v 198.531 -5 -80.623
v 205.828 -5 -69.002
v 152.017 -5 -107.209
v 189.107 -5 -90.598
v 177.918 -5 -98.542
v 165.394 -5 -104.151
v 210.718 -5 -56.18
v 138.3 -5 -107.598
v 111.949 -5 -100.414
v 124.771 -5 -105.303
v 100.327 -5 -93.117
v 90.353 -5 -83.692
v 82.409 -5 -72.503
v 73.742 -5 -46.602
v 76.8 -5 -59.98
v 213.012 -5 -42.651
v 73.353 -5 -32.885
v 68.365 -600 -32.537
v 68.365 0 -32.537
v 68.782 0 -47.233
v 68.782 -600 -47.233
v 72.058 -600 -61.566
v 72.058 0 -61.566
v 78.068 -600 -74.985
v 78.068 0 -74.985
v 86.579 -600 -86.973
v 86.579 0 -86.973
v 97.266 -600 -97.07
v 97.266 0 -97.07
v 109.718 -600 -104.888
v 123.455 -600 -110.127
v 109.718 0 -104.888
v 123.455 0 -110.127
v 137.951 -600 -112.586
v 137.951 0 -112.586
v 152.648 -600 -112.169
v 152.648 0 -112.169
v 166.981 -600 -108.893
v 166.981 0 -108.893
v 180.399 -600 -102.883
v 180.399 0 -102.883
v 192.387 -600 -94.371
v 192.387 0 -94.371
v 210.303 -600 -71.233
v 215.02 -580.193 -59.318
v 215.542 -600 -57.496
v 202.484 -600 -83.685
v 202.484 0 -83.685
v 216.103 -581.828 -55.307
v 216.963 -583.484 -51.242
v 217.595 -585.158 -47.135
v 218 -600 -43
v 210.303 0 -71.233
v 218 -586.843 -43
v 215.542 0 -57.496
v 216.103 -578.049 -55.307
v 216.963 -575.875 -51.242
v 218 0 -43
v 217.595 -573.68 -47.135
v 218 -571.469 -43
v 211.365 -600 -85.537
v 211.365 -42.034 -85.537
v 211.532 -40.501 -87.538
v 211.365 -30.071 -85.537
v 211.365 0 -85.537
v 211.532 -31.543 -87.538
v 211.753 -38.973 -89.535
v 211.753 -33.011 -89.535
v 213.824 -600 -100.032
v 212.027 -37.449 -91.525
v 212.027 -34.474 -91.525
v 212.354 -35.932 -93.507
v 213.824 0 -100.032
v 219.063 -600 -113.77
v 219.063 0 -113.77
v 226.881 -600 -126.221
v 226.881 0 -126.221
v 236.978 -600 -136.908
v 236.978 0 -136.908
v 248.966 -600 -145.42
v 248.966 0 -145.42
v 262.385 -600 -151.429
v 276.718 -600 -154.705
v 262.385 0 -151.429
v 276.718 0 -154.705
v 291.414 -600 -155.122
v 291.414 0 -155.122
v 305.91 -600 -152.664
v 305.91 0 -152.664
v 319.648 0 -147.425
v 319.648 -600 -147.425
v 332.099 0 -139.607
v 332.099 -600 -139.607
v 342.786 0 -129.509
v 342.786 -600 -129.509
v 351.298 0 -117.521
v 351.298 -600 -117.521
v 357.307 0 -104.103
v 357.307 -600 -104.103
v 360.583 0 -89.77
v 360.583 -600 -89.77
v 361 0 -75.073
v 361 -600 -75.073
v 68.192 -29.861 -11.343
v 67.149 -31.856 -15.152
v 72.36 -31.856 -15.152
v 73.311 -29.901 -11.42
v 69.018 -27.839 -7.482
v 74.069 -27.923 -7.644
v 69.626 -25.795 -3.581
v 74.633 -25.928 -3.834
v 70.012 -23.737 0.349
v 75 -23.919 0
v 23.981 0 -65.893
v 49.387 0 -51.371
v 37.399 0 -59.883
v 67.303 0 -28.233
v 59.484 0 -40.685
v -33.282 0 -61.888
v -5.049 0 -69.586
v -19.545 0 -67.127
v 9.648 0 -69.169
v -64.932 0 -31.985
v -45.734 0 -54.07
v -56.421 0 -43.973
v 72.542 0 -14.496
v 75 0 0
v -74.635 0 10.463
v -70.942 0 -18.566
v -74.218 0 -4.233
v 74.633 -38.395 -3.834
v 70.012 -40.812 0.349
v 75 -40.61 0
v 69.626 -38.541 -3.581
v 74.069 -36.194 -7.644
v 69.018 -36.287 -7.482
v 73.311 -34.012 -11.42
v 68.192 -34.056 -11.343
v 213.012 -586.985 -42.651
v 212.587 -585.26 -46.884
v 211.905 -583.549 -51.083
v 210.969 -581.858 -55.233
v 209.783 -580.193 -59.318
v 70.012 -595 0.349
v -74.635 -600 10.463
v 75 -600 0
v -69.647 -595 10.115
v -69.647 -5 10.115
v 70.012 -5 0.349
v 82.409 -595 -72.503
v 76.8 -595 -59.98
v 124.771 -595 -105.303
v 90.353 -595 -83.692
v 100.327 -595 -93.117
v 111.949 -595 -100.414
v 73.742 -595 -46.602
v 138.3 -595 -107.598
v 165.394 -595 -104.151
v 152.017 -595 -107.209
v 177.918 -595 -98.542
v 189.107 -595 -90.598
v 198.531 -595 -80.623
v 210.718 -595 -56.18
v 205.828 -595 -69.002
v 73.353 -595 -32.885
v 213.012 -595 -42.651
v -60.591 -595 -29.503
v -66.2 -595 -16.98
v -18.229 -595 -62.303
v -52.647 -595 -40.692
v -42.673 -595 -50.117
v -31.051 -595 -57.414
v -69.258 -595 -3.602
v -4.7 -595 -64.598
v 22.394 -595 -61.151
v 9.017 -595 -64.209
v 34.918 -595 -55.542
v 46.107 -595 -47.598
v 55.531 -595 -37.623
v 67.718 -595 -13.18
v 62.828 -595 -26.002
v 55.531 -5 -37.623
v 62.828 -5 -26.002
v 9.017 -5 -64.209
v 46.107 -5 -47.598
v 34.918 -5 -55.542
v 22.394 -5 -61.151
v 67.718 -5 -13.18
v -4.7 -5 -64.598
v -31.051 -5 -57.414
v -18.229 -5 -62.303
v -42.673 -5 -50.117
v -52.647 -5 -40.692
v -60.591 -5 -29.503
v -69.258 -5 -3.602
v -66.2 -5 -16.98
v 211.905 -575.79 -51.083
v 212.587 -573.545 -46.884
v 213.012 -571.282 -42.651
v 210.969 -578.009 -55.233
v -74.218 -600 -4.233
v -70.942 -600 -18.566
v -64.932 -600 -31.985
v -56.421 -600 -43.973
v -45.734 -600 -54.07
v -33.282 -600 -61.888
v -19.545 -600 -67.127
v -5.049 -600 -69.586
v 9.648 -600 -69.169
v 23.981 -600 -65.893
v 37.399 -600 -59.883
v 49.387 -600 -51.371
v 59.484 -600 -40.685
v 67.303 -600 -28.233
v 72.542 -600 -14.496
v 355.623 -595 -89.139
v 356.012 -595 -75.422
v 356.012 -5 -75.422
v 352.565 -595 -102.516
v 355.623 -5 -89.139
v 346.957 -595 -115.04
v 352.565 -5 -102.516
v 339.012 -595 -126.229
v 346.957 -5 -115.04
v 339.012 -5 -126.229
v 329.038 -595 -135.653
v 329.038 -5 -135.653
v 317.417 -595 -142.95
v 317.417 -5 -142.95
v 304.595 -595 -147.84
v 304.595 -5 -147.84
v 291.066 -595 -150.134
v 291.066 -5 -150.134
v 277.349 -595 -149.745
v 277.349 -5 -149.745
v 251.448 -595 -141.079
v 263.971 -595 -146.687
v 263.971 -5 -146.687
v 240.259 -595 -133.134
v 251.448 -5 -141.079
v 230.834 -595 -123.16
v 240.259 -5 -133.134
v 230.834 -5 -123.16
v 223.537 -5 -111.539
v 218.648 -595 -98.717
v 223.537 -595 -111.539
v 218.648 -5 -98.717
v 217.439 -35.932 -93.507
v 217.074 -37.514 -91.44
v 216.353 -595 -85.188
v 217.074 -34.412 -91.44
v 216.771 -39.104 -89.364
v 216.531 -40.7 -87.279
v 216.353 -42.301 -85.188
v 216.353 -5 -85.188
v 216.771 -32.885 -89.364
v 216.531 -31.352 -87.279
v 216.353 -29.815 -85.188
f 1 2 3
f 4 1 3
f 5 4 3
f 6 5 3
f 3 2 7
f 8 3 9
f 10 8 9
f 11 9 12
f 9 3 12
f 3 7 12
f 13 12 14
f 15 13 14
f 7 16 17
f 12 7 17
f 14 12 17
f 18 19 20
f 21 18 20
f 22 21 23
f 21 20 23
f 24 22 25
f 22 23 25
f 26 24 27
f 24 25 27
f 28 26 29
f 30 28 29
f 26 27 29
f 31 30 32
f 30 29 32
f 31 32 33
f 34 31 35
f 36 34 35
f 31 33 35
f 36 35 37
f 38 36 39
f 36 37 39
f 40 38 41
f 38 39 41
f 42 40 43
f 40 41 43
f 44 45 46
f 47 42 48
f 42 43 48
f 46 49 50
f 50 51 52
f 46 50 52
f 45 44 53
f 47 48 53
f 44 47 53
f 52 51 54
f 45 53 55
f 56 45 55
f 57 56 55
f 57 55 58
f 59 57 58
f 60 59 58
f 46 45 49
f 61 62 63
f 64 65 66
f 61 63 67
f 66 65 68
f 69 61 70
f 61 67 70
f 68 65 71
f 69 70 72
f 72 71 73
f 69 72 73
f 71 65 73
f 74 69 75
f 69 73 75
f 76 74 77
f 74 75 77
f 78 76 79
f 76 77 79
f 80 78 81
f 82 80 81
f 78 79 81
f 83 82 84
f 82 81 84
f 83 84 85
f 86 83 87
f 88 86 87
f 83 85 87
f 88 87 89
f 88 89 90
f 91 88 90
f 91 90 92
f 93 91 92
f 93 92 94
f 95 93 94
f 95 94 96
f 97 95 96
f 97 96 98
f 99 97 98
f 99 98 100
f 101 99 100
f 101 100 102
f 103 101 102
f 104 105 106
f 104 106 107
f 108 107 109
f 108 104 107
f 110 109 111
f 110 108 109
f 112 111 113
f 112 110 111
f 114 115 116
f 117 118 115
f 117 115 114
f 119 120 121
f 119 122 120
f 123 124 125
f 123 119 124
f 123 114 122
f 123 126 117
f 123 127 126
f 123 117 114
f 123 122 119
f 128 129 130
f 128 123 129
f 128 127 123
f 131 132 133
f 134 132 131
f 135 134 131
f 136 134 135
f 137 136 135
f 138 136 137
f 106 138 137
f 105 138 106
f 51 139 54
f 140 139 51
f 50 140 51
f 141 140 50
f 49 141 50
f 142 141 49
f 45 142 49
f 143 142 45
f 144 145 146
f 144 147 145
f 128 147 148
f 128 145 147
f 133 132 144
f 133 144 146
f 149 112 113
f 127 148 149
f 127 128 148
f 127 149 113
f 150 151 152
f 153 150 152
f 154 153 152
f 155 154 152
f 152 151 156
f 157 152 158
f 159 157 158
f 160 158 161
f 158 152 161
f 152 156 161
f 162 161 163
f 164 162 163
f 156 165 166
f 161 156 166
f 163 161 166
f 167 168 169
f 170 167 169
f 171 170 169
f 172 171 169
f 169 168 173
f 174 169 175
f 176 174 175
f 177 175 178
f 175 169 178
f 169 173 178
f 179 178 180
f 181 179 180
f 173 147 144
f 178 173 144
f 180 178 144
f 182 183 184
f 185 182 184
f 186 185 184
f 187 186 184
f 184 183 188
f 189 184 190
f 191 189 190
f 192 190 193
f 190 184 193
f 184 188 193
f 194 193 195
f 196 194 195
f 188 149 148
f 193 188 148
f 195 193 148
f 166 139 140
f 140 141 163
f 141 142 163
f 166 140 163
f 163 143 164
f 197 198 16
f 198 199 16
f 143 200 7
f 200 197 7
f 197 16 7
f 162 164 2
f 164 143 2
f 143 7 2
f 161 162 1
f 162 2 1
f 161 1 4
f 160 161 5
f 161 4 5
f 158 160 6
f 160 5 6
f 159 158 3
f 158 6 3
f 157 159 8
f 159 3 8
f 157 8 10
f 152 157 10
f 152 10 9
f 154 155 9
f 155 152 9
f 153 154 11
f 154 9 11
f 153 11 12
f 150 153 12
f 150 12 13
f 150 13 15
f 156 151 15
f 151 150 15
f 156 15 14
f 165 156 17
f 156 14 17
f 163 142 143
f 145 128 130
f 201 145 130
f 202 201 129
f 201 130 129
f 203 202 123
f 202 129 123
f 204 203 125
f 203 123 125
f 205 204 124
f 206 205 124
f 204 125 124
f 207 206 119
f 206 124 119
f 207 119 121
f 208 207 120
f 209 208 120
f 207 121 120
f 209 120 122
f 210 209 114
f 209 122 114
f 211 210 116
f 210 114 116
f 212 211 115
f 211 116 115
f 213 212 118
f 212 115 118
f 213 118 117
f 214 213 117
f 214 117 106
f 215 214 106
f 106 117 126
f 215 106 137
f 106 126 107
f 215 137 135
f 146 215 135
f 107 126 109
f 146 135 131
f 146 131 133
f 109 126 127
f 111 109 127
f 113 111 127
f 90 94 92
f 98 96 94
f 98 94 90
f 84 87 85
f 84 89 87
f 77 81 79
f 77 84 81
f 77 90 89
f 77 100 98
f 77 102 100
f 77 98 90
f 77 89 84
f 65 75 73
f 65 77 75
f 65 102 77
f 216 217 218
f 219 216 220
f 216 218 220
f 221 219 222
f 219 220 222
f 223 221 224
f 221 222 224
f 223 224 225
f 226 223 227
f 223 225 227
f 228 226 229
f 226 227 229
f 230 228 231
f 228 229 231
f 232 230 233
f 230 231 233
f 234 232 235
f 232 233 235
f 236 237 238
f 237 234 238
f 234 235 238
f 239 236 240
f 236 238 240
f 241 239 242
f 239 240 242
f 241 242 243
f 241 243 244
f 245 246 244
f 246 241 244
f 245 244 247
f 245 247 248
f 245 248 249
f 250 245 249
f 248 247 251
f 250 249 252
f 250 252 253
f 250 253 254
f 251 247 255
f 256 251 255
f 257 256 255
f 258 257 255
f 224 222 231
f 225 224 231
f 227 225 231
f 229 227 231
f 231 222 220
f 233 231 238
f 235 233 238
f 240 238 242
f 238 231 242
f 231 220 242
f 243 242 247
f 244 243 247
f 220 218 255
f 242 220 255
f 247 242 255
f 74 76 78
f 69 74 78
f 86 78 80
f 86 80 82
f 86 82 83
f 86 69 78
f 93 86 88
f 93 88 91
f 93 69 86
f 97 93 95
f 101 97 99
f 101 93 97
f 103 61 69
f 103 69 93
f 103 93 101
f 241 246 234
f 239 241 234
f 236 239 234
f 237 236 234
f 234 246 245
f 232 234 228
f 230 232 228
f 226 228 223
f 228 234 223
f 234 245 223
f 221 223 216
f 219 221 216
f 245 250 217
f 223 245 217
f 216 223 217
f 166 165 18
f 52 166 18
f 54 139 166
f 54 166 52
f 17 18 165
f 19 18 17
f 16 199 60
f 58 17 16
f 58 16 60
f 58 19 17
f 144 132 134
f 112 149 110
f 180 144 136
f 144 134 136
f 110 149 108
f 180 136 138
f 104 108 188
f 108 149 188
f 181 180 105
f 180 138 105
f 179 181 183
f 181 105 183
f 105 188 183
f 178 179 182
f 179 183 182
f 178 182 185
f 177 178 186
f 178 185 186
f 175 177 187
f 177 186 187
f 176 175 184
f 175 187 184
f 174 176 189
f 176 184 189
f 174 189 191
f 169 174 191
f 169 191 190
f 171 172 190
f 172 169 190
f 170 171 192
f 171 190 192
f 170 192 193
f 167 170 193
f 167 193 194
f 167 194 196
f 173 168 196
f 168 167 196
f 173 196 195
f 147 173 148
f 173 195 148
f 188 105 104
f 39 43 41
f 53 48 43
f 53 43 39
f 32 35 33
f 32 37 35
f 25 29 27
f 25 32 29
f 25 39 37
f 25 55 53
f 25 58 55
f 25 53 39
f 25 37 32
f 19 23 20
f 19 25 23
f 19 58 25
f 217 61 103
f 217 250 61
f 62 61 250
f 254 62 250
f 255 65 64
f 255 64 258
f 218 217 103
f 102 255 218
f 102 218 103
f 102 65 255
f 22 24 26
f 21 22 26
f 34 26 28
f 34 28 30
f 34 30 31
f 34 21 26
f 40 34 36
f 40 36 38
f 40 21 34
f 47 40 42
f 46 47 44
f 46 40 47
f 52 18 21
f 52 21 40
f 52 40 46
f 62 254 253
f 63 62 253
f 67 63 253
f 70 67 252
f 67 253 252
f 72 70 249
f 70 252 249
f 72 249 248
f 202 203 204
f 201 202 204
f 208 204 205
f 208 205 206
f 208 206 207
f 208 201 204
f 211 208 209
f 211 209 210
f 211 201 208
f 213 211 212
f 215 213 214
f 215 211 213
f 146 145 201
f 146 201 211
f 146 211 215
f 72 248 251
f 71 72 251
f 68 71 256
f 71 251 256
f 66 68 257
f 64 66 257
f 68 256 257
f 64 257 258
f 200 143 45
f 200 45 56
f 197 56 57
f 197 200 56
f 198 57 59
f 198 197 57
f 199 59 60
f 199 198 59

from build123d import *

# Parameters (mm, degrees)
F1_DEPTH  = 600
F3_DEPTH  = 5
F5_DEPTH  = 5
F6_ANGLE  = 4
F10_DEPTH = 178
F13_DEPTH = 121
F16_ANGLE = -8
F17_DEPTH = 105


with BuildPart() as f1:
    # F0 (on Front) → F1 (new body)
    with BuildSketch(Plane.XZ):
        with BuildLine():
            ThreePointArc((-75, 0), (0, -75), (75, 0))
            Line((75, 0), (70, 0))
            ThreePointArc((70, 0), (0, -70), (-70, 0))
            Line((-70, 0), (-75, 0))
        make_face()
    extrude(amount=F1_DEPTH)

    # F2 (on face) → F3 (join)
    with BuildSketch(Plane.XZ.offset(600)):
        with BuildLine():
            Line((70, 0), (-70, 0))
            ThreePointArc((-70, 0), (0, -70), (70, 0))
        make_face()
    extrude(amount=-F3_DEPTH)

    # F4 (on face) → F5 (join)
    with BuildSketch(Plane(origin=(0, 0, 0), x_dir=(-1, 0, 0), z_dir=(0, 1, 0))):
        with BuildLine():
            Line((70, 0), (-70, 0))
            ThreePointArc((-70, 0), (0, -70), (70, 0))
        make_face()
    extrude(amount=-F5_DEPTH)


with BuildPart() as f1_1:
    # F6: moved
    add(f1.part.rotate(Axis((75, -300, 0), (0, 1, 0)), F6_ANGLE))


with BuildPart() as f7_1:
    # F7: copy of F1
    add(f1_1.part.moved(Location((143, 0, -43))))


with BuildPart() as f8_1:
    # F8: copy of F7_1
    add(f7_1.part.moved(Location((143, 0, -53))))


with BuildPart() as f1_2:
    add(f1_1.part)

    # F9 (on Right) → F10 (cut)
    with BuildSketch(Plane.YZ):
        Polygon((-31.8559333682, -15.1517242193), (-18.6419468373, 10.0749731064), (-47.4724583328, 11.8768755347), align=None)
    extrude(amount=F10_DEPTH, mode=Mode.SUBTRACT)


with BuildPart() as f7_1_1:
    add(f7_1.part)

    # F12 (on offset) → F13 (cut)
    with BuildSketch(Plane.YZ.offset(166)):
        Polygon((-569.4248080254, -39.1771495342), (-588.6451601982, -38.5765135288), (-580.193400383, -59.3179017305), align=None)
    extrude(amount=F13_DEPTH, mode=Mode.SUBTRACT)


with BuildPart() as f8_1_1:
    # F16: moved
    add(f8_1.part.rotate(Axis((211.365392461, -300, -85.5365289384), (0, 1, 0)), F16_ANGLE))

    # F15 (on offset) → F17 (cut)
    with BuildSketch(Plane.YZ.offset(316)):
        Polygon((-35.931546241, -93.5071781278), (-15.5054412415, -65.7264964947), (-57.7888276324, -64.9577161884), align=None)
    extrude(amount=-F17_DEPTH, mode=Mode.SUBTRACT)


solid = Compound([f1_2.part, f7_1_1.part, f8_1_1.part])
